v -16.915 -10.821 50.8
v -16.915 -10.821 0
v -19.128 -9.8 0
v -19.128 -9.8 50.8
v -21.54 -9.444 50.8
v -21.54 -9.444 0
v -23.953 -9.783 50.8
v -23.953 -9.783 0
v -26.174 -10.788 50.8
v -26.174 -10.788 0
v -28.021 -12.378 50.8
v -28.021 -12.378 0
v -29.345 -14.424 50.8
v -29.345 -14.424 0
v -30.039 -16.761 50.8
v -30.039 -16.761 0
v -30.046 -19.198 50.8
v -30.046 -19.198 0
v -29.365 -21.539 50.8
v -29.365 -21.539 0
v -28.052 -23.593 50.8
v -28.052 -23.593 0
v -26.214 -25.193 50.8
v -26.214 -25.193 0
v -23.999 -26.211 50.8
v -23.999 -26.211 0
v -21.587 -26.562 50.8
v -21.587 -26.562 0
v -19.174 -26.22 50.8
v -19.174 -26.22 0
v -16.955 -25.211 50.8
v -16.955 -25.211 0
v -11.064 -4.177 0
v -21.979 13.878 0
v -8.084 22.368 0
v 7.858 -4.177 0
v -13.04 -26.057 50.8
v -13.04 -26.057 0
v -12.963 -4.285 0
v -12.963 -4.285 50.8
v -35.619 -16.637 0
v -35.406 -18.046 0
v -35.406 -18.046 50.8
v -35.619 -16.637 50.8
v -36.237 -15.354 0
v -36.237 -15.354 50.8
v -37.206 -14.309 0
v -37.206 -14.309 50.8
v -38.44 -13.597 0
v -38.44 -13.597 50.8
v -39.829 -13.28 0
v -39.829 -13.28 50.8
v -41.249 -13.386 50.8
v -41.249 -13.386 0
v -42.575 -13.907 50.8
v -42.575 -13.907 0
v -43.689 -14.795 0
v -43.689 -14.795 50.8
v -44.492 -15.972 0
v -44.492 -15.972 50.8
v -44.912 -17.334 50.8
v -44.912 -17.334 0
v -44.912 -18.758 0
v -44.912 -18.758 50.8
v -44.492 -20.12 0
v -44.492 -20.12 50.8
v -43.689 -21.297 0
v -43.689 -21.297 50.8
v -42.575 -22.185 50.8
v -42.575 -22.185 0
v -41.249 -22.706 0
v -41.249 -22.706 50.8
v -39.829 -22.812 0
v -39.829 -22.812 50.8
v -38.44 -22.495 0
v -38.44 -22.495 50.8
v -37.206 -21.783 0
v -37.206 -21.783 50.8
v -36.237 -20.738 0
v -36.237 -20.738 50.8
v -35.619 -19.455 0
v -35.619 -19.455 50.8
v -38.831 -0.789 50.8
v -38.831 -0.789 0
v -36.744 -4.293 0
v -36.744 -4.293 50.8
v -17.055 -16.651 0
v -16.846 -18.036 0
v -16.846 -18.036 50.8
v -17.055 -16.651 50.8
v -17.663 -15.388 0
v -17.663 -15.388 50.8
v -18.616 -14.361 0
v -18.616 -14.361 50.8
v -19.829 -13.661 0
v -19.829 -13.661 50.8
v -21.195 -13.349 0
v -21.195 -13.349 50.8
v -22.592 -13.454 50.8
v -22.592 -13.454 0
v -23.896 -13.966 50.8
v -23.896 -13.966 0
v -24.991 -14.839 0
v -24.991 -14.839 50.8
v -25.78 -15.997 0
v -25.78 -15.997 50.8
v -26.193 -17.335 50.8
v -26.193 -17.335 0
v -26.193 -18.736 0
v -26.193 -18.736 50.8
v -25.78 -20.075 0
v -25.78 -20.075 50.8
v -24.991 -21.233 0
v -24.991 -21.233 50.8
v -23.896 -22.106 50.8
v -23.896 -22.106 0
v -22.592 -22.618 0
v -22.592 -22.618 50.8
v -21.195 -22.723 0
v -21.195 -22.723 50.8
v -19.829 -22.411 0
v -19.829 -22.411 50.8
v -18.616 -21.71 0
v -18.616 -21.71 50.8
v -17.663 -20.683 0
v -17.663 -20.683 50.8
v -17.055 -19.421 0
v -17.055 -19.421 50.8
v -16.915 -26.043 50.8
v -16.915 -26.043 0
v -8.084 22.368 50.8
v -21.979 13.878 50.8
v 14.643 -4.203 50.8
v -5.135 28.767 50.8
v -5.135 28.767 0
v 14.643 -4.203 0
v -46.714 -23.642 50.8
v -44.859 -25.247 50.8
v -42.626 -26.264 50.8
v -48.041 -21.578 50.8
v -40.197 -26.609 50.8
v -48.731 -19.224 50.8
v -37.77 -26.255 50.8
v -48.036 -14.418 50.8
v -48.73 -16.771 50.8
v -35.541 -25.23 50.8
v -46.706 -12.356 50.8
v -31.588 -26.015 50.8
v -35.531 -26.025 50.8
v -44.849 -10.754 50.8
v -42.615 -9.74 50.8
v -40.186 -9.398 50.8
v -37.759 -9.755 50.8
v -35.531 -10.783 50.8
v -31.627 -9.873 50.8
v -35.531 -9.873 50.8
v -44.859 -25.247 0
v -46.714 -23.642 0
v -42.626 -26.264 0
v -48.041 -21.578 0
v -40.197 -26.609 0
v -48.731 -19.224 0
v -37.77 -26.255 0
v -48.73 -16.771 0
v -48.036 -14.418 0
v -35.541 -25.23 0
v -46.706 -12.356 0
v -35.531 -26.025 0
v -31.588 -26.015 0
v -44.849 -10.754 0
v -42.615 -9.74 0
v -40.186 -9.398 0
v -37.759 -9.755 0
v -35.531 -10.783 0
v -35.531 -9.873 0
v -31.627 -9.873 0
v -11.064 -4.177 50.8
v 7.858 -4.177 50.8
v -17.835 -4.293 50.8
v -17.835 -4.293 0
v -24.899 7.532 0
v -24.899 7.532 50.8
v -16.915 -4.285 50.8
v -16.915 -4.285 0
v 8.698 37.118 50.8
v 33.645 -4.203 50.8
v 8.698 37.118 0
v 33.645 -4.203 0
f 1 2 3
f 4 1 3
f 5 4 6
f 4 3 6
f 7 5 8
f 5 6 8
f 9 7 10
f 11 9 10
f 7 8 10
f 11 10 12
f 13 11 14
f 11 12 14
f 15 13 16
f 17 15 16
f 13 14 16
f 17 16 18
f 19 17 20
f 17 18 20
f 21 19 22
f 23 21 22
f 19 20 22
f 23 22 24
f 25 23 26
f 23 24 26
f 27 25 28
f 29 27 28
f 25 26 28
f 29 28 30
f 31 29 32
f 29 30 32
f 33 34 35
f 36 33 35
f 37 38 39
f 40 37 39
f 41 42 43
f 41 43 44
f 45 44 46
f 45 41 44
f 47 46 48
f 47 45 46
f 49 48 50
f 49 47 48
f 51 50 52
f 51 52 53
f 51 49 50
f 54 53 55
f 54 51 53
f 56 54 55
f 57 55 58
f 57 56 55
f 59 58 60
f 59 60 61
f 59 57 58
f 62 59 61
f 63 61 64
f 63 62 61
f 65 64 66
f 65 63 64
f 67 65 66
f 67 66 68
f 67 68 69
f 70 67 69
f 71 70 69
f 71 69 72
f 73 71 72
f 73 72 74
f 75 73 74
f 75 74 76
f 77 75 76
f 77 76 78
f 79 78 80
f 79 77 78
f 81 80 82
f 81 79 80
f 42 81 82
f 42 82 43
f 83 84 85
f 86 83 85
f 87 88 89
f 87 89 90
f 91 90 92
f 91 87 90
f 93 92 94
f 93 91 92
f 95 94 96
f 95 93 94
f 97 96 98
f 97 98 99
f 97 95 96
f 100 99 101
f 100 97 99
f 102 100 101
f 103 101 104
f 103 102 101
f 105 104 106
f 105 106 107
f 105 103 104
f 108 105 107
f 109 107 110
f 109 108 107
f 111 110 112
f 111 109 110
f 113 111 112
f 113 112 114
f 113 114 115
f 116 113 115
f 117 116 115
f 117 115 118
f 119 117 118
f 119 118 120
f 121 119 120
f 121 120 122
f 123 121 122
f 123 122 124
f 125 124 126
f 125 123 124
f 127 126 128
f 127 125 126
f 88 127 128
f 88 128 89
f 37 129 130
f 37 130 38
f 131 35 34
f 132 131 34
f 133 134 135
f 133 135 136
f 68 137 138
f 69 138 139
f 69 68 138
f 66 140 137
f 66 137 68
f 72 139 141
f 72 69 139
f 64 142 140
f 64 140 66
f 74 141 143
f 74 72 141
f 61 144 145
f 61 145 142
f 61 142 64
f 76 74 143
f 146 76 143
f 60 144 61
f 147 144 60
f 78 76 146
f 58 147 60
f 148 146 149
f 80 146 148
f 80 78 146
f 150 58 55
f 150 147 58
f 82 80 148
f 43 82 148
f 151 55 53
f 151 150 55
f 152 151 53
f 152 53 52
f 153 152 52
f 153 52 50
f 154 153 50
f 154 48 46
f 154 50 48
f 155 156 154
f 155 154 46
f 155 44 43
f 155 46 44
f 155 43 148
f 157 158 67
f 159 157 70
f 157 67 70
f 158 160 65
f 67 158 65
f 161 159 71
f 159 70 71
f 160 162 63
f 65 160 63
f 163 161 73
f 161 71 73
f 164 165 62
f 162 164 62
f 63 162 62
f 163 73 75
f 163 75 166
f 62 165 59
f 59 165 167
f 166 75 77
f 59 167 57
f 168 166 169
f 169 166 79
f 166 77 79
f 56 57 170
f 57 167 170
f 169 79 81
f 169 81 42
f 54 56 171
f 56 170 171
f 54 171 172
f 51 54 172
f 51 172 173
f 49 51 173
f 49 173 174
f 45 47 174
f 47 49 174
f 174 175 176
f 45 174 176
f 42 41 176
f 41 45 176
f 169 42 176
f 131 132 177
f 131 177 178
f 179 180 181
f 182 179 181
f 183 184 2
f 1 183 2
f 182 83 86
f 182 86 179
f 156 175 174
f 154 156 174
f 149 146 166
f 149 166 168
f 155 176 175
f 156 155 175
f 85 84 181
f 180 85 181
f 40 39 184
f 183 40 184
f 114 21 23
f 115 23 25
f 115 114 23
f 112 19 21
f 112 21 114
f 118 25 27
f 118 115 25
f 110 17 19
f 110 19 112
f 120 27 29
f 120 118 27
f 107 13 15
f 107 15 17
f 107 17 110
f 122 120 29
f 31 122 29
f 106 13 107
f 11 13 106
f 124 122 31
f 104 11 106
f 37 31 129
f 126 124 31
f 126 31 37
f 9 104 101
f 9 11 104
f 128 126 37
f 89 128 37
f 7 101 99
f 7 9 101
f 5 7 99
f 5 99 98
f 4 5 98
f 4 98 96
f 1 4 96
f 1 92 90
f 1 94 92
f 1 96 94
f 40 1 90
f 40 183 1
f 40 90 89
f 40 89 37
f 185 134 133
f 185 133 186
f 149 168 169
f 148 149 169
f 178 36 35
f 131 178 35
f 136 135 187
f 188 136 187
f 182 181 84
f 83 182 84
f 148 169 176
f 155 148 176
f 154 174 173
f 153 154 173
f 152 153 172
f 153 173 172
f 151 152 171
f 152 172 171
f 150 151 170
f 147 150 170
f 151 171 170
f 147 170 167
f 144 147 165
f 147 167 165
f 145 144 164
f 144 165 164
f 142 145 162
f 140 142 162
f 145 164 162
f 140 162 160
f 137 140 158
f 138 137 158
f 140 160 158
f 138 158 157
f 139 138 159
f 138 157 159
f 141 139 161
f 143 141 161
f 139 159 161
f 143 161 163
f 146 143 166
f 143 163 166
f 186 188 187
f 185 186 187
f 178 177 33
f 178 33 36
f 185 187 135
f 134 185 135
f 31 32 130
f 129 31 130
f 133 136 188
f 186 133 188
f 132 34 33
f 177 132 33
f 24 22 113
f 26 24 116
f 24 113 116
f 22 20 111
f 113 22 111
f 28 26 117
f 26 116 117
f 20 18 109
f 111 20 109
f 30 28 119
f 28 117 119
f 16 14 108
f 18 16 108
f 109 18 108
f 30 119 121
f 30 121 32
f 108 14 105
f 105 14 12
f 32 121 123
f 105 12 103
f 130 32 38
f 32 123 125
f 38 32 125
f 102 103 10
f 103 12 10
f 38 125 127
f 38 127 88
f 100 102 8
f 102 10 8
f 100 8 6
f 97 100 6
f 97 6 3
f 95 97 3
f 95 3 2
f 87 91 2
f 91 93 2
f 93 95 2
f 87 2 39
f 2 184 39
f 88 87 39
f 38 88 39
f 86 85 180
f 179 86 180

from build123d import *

# Parameters (mm, degrees)
F1_DEPTH = 50.8
F3_DEPTH = 50.8
F5_DEPTH = 50.8
F6_R     = 4.779489
F7_DEPTH = 50.8
F8_R     = 4.699821
F9_DEPTH = 50.8


with BuildPart() as f1:
    # F0 (on Top) → F1 (new body)
    with BuildSketch(Plane.XY):
        Polygon((-24.898751, 7.532405), (-38.831126, -0.78943), (-36.743611, -4.29304), (-17.83539, -4.29304), align=None)
    extrude(amount=F1_DEPTH)


with BuildPart() as f3:
    # F2 (on Top) → F3 (new body)
    with BuildSketch(Plane.XY):
        Polygon((-8.083949, 22.367807), (-21.979075, 13.878456), (-11.063538, -4.177323), (7.858154, -4.177323), align=None)
    extrude(amount=F3_DEPTH)


with BuildPart() as f5:
    # F4 (on Top) → F5 (new body)
    with BuildSketch(Plane.XY):
        Polygon((8.697755, 37.11848), (-5.134949, 28.767396), (14.64319, -4.203232), (33.644509, -4.203232), align=None)
    extrude(amount=F5_DEPTH)


with BuildPart() as f7:
    # F6 (on Top) → F7 (new body)
    with BuildSketch(Plane.XY):
        with BuildLine():
            Line((-35.53104, -9.872872), (-35.53104, -10.782821))
            ThreePointArc((-35.53104, -10.782821), (-48.818442, -17.997706), (-35.54067, -25.230298))
            Line((-35.54067, -25.230298), (-35.53104, -26.024793))
            Line((-35.53104, -26.024793), (-31.587737, -26.015215))
            Line((-31.587737, -26.015215), (-31.626943, -9.872872))
            Line((-31.626943, -9.872872), (-35.53104, -9.872872))
        make_face()
        with Locations((-40.185747, -18.046049)):
            Circle(F6_R, mode=Mode.SUBTRACT)
    extrude(amount=F7_DEPTH)


with BuildPart() as f9:
    # F8 (on Top) → F9 (new body)
    with BuildSketch(Plane.XY):
        with BuildLine():
            Line((-16.915079, -4.285301), (-16.915079, -10.821003))
            ThreePointArc((-16.915079, -10.821003), (-30.129358, -17.979524), (-16.955052, -25.211345))
            Line((-16.955052, -25.211345), (-16.915079, -26.043249))
            Line((-16.915079, -26.043249), (-13.039545, -26.056853))
            Line((-13.039545, -26.056853), (-12.963125, -4.285301))
            Line((-12.963125, -4.285301), (-16.915079, -4.285301))
        make_face()
        with Locations((-21.545883, -18.035851)):
            Circle(F8_R, mode=Mode.SUBTRACT)
    extrude(amount=F9_DEPTH)


solid = Compound([f1.part, f3.part, f5.part, f7.part, f9.part])
